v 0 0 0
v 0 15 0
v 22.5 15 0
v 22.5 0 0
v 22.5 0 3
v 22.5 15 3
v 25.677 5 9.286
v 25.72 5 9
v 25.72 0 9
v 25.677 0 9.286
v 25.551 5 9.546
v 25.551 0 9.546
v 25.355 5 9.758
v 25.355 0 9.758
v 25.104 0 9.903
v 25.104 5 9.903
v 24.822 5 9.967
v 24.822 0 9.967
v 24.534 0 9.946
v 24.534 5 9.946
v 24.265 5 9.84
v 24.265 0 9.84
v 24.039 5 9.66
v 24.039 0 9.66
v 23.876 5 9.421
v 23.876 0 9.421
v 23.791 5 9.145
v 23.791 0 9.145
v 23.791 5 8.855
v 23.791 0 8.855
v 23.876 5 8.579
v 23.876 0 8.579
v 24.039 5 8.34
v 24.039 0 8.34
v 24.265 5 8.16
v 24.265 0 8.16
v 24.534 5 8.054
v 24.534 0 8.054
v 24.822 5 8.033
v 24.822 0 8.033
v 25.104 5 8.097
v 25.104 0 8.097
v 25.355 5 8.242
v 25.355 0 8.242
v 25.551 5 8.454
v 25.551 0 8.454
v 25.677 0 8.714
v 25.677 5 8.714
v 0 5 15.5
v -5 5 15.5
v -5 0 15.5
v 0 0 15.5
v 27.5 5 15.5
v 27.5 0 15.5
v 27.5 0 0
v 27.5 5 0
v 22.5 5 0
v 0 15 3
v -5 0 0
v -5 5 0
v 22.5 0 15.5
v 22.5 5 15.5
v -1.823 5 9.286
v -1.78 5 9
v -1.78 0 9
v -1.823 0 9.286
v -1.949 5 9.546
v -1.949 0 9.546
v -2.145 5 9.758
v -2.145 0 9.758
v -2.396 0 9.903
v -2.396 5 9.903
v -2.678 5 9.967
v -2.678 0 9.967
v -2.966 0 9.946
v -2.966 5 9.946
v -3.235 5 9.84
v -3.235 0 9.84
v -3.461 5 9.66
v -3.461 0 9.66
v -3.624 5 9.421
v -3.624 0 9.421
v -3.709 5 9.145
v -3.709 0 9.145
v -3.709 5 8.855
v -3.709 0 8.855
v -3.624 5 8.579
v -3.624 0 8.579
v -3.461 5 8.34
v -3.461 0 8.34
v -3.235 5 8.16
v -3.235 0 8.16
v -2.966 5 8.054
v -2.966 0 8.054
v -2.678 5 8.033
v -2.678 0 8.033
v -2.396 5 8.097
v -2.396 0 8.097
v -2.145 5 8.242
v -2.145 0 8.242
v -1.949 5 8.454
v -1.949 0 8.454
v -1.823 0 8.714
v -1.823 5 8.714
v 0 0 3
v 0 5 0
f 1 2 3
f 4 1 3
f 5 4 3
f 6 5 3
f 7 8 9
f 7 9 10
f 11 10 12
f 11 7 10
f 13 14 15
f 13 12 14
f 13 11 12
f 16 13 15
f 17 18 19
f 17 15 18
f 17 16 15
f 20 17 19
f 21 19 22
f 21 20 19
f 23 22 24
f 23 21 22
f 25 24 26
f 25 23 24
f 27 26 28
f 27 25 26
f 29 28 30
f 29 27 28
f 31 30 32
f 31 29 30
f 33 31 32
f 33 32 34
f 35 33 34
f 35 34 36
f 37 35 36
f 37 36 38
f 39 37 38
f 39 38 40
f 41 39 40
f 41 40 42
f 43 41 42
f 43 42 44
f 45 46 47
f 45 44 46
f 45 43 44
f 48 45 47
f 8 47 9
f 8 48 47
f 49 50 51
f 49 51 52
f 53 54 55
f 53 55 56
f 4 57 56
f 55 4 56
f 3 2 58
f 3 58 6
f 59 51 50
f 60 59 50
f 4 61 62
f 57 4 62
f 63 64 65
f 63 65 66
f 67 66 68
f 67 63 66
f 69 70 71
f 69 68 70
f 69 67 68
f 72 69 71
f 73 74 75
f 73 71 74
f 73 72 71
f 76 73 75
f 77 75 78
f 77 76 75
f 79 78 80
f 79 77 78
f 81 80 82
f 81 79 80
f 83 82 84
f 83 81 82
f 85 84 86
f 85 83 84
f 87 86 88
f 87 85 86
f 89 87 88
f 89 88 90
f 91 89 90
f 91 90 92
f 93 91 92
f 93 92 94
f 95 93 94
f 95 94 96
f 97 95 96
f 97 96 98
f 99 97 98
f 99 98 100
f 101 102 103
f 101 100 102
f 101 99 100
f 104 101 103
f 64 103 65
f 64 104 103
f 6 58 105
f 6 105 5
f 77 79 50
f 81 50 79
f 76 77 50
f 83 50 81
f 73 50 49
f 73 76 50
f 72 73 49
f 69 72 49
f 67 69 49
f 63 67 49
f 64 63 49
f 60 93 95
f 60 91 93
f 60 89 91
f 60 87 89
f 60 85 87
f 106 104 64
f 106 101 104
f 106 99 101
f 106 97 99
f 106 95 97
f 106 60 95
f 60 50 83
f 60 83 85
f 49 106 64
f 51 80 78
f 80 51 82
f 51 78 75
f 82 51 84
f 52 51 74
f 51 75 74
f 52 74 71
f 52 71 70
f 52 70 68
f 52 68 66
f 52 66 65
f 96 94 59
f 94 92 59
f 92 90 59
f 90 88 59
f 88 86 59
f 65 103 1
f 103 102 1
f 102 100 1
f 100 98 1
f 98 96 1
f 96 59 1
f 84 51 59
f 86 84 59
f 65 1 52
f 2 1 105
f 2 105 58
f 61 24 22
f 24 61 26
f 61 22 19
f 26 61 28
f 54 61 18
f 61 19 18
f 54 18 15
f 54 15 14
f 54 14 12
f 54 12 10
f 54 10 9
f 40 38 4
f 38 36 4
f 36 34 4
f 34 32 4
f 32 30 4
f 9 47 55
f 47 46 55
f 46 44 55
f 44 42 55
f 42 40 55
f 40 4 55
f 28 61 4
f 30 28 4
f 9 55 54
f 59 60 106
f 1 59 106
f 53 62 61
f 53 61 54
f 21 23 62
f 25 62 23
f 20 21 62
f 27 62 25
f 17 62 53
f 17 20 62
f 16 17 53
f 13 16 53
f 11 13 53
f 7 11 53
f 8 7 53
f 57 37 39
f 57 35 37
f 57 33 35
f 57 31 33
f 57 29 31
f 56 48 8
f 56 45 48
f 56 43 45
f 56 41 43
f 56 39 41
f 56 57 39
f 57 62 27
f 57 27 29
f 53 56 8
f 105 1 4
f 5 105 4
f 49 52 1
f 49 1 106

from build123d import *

# Parameters (mm, degrees)
BOX_W                  = 22.5
BOX_H                  = 15
BOX_DEPTH              = 3
CYLINDER_R             = 0.97
CYLINDER_DEPTH         = 10
CYLINDER_ROLL_ANGLE    = 90
BOX001_W               = 5
BOX001_H               = 5
BOX001_DEPTH           = 15.5
CYLINDER001_R          = 0.97
CYLINDER001_DEPTH      = 10
CYLINDER001_ROLL_ANGLE = 90
BOX002_W               = 5
BOX002_H               = 5
BOX002_DEPTH           = 15.5


with BuildPart() as box:
    # Box → Box (new body)
    with BuildSketch(Plane.XY):
        with Locations((11.25, 7.5)):
            Rectangle(BOX_W, BOX_H)
    extrude(amount=BOX_DEPTH)


with BuildPart() as cylinder:
    # Cylinder → Cylinder (new body)
    with BuildSketch(Plane.XY):
        Circle(CYLINDER_R)
    extrude(amount=CYLINDER_DEPTH)


with BuildPart() as cylinder_1:
    # Cylinder roll: moved
    add(cylinder.part.rotate(Axis((0, 0, 0), (1, 0, 0)), CYLINDER_ROLL_ANGLE))


with BuildPart() as cylinder_2:
    # Cylinder placement: moved
    add(cylinder_1.part.moved(Location((-2.75, 7, 9))))


with BuildPart() as cut:
    # Box001 → Box001 (new body)
    with BuildSketch(Plane(origin=(-5, 0, 0), x_dir=(1, 0, 0), z_dir=(0, 0, 1))):
        with Locations((2.5, 2.5)):
            Rectangle(BOX001_W, BOX001_H)
    extrude(amount=BOX001_DEPTH)

    # Cut: cut Cylinder
    add(cylinder_2.part, mode=Mode.SUBTRACT)


with BuildPart() as cylinder001:
    # Cylinder001 → Cylinder001 (new body)
    with BuildSketch(Plane.XY):
        Circle(CYLINDER001_R)
    extrude(amount=CYLINDER001_DEPTH)


with BuildPart() as cylinder001_1:
    # Cylinder001 roll: moved
    add(cylinder001.part.rotate(Axis((0, 0, 0), (1, 0, 0)), CYLINDER001_ROLL_ANGLE))


with BuildPart() as cylinder001_2:
    # Cylinder001 placement: moved
    add(cylinder001_1.part.moved(Location((24.75, 7, 9))))


with BuildPart() as cut001:
    # Box002 → Box002 (new body)
    with BuildSketch(Plane(origin=(22.5, 0, 0), x_dir=(1, 0, 0), z_dir=(0, 0, 1))):
        with Locations((2.5, 2.5)):
            Rectangle(BOX002_W, BOX002_H)
    extrude(amount=BOX002_DEPTH)

    # Cut001: cut Cylinder001
    add(cylinder001_2.part, mode=Mode.SUBTRACT)


solid = Compound([box.part, cut.part, cut001.part])
